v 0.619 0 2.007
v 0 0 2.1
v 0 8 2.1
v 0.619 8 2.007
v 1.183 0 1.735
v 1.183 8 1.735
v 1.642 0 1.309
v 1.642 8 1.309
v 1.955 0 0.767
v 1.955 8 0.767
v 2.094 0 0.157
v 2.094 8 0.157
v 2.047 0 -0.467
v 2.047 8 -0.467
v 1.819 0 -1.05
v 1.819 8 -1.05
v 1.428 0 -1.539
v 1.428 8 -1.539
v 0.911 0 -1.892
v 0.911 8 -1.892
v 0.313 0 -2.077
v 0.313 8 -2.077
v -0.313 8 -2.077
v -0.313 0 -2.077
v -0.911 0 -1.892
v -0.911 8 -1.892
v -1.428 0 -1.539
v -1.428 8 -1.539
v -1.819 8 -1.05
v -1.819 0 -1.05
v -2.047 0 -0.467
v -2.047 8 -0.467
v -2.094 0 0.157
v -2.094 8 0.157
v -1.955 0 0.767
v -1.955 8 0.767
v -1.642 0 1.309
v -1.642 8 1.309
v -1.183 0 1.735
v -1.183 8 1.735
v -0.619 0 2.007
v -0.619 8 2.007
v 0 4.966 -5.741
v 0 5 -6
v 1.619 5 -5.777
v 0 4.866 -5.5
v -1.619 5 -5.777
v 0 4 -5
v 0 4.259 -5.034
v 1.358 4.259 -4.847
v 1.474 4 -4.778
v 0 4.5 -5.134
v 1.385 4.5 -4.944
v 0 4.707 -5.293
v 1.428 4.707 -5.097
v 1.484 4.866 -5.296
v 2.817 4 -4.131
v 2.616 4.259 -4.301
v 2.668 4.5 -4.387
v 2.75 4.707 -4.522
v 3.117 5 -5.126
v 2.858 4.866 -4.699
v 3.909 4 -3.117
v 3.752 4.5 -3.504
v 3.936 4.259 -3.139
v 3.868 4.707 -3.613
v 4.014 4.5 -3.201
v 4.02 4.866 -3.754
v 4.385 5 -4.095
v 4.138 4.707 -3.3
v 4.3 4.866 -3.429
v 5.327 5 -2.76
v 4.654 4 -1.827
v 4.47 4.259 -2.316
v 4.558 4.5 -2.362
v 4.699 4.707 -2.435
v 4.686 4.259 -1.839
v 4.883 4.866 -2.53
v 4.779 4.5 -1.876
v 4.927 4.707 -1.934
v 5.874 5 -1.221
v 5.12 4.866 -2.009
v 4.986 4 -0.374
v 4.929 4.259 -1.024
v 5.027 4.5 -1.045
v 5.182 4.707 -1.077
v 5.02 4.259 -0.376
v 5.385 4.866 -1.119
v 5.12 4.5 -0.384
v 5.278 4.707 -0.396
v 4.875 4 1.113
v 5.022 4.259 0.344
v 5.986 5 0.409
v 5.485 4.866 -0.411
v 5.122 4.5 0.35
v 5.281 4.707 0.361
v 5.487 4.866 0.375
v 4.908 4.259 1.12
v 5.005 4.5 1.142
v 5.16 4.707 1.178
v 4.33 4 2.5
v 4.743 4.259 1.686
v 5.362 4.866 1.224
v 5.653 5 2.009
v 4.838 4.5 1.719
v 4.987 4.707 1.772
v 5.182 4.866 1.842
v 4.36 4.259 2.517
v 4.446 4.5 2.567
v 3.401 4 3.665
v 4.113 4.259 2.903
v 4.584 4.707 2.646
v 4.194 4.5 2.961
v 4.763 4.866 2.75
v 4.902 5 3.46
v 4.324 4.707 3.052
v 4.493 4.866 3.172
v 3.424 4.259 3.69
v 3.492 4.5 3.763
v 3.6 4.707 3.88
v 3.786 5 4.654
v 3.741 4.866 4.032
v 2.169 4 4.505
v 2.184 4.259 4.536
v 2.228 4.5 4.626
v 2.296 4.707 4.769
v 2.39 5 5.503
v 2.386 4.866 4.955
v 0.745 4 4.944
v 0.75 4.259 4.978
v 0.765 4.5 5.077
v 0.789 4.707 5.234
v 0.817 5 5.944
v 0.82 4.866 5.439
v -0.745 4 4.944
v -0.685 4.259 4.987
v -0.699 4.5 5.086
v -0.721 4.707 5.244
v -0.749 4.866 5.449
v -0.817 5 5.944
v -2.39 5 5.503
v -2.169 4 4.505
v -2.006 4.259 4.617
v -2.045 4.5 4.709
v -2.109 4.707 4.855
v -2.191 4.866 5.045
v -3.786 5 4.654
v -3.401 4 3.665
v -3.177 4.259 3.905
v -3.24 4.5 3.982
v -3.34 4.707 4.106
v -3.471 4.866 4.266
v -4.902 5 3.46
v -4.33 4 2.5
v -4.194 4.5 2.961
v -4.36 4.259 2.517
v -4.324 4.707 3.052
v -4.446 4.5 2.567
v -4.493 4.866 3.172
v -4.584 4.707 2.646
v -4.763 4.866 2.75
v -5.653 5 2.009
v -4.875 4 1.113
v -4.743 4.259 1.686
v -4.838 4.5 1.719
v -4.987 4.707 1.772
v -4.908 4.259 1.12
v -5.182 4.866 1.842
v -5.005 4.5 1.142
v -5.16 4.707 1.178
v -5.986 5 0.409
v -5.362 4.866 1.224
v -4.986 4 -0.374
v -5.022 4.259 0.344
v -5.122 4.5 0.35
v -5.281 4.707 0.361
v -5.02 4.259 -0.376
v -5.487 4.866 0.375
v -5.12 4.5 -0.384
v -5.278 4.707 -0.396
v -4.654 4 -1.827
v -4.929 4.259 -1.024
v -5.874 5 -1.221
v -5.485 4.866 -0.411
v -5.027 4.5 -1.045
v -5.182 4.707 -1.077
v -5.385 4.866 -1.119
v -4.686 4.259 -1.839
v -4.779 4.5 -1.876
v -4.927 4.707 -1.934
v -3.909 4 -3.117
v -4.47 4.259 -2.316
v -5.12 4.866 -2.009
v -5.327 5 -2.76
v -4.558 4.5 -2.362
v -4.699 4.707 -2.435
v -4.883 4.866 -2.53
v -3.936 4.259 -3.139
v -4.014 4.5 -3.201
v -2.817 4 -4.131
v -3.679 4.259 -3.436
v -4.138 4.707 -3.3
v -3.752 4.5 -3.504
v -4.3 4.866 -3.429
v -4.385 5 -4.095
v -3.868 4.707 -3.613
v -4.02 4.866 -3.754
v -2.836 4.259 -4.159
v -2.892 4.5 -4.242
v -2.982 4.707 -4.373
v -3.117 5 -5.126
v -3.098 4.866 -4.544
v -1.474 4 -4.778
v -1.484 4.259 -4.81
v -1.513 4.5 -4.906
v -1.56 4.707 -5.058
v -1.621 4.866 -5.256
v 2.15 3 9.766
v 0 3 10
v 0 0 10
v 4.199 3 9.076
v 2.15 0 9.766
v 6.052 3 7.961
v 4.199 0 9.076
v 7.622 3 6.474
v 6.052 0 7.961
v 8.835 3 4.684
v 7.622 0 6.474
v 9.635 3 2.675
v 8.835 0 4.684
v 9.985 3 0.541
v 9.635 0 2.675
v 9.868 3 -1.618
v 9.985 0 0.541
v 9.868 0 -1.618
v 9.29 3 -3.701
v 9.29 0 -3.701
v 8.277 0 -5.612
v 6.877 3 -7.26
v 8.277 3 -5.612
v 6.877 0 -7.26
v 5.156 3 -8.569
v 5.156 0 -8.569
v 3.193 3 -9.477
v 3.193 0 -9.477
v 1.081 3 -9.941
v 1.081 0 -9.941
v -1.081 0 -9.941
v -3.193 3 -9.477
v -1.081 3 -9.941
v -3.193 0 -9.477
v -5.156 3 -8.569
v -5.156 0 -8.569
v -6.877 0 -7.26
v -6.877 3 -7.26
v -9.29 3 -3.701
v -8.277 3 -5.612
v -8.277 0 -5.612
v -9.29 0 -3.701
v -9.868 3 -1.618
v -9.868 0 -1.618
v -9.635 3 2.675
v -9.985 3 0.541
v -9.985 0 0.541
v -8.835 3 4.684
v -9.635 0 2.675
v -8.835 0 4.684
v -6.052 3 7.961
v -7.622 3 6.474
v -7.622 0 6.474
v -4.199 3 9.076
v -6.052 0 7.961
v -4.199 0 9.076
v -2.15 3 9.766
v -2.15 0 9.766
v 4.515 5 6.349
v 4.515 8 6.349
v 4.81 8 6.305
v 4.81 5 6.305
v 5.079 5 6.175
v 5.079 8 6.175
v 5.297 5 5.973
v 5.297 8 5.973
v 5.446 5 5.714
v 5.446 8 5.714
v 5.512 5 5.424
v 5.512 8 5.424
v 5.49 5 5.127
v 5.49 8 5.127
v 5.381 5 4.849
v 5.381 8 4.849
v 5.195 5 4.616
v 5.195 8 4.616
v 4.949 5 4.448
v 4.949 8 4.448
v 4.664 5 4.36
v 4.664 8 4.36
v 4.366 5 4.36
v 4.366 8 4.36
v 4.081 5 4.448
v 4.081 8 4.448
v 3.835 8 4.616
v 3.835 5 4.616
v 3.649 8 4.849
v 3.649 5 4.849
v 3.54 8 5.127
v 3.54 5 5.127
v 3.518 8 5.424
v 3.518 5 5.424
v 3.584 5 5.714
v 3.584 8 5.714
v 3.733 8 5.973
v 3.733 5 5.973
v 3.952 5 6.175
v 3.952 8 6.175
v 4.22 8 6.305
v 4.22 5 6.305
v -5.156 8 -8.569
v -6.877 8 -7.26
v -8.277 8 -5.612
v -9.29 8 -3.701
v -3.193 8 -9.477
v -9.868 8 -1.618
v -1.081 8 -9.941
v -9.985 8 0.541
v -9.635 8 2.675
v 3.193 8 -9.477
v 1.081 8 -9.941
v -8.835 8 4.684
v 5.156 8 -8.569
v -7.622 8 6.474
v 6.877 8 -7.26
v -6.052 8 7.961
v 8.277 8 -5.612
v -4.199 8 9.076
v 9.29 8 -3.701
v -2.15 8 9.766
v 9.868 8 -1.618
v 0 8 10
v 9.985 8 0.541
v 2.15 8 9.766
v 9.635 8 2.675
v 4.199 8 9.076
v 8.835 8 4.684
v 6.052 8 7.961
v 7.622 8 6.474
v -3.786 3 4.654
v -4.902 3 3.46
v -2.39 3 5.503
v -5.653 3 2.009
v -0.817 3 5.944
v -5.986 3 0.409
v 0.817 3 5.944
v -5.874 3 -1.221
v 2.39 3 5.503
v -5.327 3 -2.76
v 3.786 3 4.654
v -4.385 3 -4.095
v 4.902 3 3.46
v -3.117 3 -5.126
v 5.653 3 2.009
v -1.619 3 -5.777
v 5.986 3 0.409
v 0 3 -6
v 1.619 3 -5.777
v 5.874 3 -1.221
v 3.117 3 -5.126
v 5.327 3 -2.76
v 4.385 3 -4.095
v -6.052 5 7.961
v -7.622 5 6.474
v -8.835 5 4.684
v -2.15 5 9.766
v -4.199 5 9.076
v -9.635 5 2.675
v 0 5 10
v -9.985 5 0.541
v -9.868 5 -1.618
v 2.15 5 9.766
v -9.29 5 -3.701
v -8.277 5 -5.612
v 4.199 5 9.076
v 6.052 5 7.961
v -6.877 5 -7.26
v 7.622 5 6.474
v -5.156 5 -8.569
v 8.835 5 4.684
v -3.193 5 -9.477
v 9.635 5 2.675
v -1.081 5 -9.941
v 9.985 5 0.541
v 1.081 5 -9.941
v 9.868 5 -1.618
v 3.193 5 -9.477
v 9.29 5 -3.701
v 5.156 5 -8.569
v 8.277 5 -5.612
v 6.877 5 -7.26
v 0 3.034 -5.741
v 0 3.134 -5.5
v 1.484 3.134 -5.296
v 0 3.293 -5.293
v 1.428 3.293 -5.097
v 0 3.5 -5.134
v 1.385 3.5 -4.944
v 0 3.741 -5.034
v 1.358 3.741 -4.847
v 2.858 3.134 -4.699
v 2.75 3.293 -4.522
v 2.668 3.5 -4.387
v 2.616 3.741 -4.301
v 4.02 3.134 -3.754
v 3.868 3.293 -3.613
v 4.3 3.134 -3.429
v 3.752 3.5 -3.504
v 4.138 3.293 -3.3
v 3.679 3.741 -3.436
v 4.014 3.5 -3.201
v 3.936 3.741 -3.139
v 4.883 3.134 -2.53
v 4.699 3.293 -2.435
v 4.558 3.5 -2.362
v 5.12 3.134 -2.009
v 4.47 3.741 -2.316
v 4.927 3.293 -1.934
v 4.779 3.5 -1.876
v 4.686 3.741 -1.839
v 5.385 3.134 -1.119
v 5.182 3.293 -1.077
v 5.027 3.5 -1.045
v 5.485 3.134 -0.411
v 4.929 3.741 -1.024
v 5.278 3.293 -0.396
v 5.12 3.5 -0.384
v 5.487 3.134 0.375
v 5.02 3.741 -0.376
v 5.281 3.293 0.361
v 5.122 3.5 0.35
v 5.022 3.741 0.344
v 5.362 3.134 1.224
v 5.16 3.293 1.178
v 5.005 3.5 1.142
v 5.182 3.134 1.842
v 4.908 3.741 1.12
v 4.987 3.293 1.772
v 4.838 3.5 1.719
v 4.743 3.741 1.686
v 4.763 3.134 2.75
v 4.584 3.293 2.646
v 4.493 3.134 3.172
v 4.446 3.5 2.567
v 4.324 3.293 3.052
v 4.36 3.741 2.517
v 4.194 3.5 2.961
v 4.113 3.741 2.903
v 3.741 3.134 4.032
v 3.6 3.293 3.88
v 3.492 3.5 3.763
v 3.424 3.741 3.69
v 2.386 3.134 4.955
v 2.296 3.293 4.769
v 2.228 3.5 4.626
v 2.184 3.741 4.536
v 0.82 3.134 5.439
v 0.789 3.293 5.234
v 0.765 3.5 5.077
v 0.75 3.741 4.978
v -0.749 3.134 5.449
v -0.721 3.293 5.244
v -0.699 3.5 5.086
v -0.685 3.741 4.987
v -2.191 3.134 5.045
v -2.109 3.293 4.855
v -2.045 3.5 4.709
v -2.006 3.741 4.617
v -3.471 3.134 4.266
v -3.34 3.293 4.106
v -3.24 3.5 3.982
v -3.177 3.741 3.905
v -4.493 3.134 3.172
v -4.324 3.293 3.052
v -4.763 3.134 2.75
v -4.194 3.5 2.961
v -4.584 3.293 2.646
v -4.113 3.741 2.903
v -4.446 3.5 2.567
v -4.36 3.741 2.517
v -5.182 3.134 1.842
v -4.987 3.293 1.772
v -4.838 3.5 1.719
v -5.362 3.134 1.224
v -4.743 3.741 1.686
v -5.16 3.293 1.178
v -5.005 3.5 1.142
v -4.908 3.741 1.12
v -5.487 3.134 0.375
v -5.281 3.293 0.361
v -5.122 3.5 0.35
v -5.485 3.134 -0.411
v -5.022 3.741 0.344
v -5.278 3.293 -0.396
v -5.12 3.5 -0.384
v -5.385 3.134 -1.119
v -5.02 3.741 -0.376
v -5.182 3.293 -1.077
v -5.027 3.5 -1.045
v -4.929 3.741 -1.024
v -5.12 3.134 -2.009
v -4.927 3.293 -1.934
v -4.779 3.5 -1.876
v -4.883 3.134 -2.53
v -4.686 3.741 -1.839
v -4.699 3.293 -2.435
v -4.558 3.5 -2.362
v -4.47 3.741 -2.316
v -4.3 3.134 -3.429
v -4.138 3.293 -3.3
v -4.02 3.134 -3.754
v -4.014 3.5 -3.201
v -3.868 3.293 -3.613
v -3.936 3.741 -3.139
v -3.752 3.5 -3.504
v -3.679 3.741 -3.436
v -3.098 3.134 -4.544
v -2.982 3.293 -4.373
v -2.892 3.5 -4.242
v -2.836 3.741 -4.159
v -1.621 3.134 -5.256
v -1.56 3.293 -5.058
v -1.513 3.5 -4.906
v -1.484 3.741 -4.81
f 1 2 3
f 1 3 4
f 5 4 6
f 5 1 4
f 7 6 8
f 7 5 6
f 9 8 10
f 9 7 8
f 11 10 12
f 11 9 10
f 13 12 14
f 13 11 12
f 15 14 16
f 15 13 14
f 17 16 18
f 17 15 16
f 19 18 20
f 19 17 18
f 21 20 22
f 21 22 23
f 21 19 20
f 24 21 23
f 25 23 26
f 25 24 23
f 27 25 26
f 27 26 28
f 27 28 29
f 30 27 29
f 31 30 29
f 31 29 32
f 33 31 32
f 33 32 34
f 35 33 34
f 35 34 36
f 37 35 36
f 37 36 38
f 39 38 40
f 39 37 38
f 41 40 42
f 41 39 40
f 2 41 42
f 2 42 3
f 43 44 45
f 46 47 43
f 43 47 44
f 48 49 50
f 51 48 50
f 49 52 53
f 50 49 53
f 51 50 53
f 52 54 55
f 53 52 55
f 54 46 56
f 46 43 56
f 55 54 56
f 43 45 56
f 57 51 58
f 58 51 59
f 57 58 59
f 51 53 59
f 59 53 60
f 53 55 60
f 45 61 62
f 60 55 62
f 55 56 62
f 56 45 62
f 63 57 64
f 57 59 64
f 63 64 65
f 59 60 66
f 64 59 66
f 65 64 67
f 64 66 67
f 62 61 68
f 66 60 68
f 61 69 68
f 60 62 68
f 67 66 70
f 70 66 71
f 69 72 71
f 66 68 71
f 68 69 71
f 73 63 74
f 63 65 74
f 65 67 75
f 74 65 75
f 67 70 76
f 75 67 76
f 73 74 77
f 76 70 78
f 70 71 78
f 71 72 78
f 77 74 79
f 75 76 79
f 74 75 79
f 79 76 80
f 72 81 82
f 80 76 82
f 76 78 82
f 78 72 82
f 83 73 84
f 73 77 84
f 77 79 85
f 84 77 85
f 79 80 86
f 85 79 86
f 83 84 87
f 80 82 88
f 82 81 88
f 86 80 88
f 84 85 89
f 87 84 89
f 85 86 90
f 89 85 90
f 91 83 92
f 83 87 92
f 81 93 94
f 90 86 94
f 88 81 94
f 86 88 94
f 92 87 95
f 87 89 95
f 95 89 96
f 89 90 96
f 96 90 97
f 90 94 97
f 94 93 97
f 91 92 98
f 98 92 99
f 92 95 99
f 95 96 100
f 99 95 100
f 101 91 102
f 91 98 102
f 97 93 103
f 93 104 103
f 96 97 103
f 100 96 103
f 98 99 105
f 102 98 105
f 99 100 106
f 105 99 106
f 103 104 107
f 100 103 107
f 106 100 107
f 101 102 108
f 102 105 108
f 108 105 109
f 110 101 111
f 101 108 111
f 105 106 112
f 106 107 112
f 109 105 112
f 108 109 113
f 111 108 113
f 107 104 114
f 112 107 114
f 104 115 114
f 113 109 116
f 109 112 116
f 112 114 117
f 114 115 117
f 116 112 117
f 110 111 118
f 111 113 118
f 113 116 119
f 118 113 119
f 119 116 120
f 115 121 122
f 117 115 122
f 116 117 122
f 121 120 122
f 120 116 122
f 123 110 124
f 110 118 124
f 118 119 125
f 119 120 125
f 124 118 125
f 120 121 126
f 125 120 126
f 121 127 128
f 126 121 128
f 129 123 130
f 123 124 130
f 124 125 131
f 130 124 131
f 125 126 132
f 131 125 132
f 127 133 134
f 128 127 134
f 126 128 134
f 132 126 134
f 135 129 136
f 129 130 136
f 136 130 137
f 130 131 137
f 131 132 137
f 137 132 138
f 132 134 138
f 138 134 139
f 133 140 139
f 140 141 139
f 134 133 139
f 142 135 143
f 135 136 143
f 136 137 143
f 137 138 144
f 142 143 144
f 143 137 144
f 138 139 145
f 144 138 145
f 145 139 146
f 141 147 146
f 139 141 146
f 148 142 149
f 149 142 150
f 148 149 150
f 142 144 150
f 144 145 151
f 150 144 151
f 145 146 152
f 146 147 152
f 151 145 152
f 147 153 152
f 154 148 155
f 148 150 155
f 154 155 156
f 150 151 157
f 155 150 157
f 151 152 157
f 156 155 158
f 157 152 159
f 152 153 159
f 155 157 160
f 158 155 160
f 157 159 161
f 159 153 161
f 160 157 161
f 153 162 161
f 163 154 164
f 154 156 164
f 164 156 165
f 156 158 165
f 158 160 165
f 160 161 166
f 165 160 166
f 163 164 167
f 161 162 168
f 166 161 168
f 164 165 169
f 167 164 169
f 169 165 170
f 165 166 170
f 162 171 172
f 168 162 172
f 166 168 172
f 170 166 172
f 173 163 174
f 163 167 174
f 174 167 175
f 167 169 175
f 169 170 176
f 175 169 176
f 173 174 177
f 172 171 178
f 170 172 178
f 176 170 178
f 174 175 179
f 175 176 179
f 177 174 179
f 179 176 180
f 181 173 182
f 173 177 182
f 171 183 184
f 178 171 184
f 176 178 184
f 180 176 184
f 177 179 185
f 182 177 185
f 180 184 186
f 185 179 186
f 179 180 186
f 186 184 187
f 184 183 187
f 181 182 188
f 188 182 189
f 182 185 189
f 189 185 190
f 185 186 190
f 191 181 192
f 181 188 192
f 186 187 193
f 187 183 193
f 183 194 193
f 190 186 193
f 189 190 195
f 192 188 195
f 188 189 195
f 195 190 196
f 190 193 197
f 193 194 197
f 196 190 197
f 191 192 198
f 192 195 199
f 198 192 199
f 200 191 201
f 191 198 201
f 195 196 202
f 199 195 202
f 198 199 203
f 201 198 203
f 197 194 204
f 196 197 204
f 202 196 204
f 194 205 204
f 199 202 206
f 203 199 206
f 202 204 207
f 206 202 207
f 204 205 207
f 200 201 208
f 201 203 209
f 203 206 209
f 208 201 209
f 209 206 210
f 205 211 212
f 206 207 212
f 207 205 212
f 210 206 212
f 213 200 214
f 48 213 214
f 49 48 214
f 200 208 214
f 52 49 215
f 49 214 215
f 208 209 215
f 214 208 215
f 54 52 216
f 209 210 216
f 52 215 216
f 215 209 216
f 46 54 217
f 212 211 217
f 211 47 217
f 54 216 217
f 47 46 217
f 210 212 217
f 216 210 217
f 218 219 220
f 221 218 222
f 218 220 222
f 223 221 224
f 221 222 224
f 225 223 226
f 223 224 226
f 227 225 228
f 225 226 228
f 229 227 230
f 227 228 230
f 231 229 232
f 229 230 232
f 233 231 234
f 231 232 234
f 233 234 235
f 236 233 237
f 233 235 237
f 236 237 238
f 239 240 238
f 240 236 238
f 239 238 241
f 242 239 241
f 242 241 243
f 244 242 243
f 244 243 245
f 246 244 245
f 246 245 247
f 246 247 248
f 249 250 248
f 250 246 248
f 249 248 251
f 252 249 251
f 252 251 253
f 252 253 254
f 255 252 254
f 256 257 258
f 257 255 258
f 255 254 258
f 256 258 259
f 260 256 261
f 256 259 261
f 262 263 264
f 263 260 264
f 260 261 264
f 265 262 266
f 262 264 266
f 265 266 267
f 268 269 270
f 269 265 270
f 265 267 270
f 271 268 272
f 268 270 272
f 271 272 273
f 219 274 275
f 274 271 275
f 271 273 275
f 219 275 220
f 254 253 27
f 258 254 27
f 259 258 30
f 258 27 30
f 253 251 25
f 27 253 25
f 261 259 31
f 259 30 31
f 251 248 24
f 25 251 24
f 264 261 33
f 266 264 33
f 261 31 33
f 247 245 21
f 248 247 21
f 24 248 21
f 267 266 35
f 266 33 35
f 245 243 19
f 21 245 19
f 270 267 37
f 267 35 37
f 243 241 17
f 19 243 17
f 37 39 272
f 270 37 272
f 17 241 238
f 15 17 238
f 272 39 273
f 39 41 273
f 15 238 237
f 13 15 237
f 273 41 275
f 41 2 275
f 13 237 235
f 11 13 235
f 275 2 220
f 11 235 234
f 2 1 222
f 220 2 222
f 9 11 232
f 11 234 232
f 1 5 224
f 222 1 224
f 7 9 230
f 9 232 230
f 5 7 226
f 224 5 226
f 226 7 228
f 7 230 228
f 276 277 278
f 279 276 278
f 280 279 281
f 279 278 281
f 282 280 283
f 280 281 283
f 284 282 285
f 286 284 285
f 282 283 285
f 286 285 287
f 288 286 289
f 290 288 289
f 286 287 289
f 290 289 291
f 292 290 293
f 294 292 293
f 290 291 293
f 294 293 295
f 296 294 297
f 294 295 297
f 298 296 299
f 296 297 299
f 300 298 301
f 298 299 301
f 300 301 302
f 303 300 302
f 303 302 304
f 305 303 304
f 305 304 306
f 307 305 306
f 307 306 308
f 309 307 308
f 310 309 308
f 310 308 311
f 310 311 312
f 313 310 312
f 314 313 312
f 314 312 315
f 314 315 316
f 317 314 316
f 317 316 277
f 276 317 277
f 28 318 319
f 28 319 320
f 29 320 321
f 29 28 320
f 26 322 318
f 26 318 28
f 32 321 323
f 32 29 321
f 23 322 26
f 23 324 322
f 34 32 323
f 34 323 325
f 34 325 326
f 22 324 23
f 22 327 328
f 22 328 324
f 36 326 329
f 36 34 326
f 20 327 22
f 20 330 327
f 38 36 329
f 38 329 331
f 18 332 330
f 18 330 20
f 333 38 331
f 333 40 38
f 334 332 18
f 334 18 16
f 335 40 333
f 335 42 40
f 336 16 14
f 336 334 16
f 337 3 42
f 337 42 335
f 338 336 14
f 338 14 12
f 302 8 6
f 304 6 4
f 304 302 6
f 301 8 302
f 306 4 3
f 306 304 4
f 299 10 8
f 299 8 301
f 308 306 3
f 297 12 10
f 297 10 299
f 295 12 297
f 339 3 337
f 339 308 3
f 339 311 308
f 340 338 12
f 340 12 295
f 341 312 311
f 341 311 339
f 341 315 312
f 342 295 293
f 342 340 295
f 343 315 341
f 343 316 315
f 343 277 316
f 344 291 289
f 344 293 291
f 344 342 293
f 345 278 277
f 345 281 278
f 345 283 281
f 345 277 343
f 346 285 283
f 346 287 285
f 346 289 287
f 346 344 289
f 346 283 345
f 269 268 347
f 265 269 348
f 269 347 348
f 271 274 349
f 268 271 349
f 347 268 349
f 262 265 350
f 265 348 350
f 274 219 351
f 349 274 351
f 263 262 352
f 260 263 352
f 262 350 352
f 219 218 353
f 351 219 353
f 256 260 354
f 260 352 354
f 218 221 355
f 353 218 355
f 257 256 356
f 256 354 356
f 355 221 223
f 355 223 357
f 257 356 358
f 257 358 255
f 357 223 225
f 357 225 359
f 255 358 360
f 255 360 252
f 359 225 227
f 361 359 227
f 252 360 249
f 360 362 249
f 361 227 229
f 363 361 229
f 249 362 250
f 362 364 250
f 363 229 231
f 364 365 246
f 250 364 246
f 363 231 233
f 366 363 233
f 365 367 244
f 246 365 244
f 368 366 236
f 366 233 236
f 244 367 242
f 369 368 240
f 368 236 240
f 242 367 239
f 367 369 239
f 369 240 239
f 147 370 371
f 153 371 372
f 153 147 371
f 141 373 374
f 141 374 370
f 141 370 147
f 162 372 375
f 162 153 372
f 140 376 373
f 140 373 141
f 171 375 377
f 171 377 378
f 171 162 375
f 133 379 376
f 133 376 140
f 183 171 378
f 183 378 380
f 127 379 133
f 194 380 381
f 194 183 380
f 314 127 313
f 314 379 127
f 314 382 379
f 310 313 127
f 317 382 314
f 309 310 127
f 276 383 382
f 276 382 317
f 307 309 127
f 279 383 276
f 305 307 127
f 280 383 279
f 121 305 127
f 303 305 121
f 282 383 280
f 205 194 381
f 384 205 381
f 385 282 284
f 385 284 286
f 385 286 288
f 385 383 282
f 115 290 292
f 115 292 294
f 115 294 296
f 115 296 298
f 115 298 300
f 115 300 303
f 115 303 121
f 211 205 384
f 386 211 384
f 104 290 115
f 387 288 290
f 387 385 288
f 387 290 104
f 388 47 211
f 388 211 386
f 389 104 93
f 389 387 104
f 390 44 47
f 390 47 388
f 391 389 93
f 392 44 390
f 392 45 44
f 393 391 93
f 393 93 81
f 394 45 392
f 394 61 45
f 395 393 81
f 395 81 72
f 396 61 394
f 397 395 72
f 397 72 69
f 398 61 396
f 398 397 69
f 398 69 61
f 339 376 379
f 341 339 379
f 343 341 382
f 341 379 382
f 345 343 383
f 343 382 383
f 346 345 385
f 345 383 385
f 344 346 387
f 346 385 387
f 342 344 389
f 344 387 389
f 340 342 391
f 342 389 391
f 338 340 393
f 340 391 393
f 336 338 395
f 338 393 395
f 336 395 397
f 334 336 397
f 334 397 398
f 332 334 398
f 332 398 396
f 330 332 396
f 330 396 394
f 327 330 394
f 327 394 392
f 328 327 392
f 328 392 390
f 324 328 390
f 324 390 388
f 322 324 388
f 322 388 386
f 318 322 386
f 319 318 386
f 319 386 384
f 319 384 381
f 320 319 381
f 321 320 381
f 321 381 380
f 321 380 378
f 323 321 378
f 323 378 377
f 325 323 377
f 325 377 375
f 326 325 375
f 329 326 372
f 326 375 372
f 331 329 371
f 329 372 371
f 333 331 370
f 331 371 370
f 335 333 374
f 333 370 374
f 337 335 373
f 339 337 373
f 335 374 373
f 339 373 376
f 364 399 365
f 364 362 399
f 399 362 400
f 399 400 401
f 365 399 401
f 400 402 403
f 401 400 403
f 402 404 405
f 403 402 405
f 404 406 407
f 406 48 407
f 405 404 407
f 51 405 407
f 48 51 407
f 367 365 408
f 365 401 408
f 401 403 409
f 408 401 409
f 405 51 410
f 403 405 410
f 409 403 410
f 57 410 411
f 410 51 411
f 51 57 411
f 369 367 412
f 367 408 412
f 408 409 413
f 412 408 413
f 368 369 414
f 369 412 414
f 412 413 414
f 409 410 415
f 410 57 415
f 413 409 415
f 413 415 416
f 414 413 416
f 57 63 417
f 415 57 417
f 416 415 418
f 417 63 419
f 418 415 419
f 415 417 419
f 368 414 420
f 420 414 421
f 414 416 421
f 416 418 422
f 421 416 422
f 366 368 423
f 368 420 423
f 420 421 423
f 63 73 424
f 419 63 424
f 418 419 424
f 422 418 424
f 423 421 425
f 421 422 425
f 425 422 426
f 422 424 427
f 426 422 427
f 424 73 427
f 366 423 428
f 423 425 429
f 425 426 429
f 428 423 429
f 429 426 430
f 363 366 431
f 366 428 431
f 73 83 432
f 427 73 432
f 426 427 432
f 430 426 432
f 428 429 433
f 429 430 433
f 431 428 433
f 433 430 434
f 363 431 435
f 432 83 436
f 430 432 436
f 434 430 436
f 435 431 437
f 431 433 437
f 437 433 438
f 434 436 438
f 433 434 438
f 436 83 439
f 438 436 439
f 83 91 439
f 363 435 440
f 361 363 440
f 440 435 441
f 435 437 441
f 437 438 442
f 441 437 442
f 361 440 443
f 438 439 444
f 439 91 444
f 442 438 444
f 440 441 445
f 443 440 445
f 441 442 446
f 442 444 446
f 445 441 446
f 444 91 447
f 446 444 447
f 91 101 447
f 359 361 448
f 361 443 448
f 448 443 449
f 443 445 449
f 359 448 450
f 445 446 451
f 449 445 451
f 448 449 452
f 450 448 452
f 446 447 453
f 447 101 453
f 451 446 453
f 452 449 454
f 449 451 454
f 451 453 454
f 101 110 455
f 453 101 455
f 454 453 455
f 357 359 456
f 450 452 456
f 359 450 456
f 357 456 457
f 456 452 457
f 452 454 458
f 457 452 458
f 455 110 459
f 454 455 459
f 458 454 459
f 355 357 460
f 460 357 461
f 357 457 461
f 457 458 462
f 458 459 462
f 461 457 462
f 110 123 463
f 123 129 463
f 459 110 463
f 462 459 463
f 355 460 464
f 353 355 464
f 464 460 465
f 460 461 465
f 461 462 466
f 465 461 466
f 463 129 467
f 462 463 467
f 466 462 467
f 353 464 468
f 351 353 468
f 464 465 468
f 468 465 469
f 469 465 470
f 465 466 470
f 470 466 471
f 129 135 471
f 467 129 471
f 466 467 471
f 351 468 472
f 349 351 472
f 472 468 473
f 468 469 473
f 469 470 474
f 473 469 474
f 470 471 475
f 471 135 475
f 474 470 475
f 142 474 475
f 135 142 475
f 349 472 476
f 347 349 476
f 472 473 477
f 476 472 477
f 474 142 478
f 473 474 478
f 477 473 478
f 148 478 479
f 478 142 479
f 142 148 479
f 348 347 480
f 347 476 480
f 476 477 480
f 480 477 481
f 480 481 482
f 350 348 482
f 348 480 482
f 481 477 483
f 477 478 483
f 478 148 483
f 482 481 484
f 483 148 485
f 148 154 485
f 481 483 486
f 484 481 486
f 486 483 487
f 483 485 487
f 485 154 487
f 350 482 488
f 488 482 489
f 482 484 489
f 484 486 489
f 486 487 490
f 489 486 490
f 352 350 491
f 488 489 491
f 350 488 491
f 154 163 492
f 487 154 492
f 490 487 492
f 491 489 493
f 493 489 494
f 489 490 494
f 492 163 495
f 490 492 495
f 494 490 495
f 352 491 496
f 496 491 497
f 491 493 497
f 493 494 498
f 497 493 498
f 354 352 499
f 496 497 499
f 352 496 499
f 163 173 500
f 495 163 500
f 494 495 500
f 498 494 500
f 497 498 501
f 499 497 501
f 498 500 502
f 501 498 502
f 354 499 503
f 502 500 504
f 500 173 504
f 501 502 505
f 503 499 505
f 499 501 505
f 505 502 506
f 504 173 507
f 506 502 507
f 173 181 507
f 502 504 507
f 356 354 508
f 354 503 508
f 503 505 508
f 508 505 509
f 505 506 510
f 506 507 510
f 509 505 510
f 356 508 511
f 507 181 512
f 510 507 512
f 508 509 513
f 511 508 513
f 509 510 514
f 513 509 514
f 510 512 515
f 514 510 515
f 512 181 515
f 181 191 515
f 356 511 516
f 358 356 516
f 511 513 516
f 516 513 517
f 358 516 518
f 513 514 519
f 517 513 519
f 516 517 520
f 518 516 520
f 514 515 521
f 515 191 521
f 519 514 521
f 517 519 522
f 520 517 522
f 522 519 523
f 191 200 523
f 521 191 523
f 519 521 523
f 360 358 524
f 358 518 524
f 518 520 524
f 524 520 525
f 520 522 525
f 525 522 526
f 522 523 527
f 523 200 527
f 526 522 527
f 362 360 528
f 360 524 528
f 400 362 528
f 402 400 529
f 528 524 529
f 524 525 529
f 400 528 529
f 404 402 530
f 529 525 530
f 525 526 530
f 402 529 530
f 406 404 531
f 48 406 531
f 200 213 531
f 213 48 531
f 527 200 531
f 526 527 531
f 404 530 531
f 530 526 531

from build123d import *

# Parameters (mm, degrees)
SKETCH_1_R          = 10
SKETCH_1_R_2        = 2.1
EXTRUDE_1_DEPTH     = 8
CUT_EXTRUDE_START   = -3
SKETCH_2_R          = 10
SKETCH_2_R_2        = 5
CUT_EXTRUDE_1_DEPTH = 2
FILLET_1_R          = 1
CUT_EXTRUDE_2_REACH = 18.248
SKETCH_3_R          = 1


with BuildPart() as part:
    # 草图1 → 凸台-拉伸1 (new body)
    with BuildSketch(Plane(origin=(0, 0, 0), x_dir=(1, 0, 0), z_dir=(0, 1, 0))):
        with Locations(Location((0, 0, 0), (0, 0, 270))):
            Circle(SKETCH_1_R)
        with Locations(Location((0, 0, 0), (0, 0, 270))):
            Circle(SKETCH_1_R_2, mode=Mode.SUBTRACT)
    extrude(amount=EXTRUDE_1_DEPTH)

    # 草图2 → 切除-拉伸1 (cut)
    with BuildSketch(Plane.XZ.offset(CUT_EXTRUDE_START)):
        with Locations(Location((0, 0, 0), (0, 0, 270))):
            Circle(SKETCH_2_R)
        with Locations(Location((0, 0, 0), (0, 0, 270))):
            Circle(SKETCH_2_R_2, mode=Mode.SUBTRACT)
    extrude(amount=-CUT_EXTRUDE_1_DEPTH, mode=Mode.SUBTRACT)

    # 圆角1
    fillet_1_edges = [part.edges().sort_by_distance(p)[0] for p in [
        (0, 5, 5),
        (0, 3, 5),
    ]]
    fillet(fillet_1_edges, radius=FILLET_1_R - 0.0001)  # a hair under: the kernel refuses the full size

    # 草图3 → 切除-拉伸2 (cut, up to next)
    with BuildSketch(Plane(origin=(0, 8, 0), x_dir=(1, 0, 0), z_dir=(0, 1, 0)), mode=Mode.PRIVATE) as cut_extrude_2_sk1:
        with Locations(Location((4.515189348, -5.349118166, 0), (0, 0, 270))):
            Circle(SKETCH_3_R)
    cut_extrude_2_tool1 = extrude(cut_extrude_2_sk1.sketch, amount=-CUT_EXTRUDE_2_REACH, mode=Mode.PRIVATE) & part.part
    add(cut_extrude_2_tool1.solids().sort_by_distance((4.515189, 8, 5.349118))[0], mode=Mode.SUBTRACT)


solid = part.part
